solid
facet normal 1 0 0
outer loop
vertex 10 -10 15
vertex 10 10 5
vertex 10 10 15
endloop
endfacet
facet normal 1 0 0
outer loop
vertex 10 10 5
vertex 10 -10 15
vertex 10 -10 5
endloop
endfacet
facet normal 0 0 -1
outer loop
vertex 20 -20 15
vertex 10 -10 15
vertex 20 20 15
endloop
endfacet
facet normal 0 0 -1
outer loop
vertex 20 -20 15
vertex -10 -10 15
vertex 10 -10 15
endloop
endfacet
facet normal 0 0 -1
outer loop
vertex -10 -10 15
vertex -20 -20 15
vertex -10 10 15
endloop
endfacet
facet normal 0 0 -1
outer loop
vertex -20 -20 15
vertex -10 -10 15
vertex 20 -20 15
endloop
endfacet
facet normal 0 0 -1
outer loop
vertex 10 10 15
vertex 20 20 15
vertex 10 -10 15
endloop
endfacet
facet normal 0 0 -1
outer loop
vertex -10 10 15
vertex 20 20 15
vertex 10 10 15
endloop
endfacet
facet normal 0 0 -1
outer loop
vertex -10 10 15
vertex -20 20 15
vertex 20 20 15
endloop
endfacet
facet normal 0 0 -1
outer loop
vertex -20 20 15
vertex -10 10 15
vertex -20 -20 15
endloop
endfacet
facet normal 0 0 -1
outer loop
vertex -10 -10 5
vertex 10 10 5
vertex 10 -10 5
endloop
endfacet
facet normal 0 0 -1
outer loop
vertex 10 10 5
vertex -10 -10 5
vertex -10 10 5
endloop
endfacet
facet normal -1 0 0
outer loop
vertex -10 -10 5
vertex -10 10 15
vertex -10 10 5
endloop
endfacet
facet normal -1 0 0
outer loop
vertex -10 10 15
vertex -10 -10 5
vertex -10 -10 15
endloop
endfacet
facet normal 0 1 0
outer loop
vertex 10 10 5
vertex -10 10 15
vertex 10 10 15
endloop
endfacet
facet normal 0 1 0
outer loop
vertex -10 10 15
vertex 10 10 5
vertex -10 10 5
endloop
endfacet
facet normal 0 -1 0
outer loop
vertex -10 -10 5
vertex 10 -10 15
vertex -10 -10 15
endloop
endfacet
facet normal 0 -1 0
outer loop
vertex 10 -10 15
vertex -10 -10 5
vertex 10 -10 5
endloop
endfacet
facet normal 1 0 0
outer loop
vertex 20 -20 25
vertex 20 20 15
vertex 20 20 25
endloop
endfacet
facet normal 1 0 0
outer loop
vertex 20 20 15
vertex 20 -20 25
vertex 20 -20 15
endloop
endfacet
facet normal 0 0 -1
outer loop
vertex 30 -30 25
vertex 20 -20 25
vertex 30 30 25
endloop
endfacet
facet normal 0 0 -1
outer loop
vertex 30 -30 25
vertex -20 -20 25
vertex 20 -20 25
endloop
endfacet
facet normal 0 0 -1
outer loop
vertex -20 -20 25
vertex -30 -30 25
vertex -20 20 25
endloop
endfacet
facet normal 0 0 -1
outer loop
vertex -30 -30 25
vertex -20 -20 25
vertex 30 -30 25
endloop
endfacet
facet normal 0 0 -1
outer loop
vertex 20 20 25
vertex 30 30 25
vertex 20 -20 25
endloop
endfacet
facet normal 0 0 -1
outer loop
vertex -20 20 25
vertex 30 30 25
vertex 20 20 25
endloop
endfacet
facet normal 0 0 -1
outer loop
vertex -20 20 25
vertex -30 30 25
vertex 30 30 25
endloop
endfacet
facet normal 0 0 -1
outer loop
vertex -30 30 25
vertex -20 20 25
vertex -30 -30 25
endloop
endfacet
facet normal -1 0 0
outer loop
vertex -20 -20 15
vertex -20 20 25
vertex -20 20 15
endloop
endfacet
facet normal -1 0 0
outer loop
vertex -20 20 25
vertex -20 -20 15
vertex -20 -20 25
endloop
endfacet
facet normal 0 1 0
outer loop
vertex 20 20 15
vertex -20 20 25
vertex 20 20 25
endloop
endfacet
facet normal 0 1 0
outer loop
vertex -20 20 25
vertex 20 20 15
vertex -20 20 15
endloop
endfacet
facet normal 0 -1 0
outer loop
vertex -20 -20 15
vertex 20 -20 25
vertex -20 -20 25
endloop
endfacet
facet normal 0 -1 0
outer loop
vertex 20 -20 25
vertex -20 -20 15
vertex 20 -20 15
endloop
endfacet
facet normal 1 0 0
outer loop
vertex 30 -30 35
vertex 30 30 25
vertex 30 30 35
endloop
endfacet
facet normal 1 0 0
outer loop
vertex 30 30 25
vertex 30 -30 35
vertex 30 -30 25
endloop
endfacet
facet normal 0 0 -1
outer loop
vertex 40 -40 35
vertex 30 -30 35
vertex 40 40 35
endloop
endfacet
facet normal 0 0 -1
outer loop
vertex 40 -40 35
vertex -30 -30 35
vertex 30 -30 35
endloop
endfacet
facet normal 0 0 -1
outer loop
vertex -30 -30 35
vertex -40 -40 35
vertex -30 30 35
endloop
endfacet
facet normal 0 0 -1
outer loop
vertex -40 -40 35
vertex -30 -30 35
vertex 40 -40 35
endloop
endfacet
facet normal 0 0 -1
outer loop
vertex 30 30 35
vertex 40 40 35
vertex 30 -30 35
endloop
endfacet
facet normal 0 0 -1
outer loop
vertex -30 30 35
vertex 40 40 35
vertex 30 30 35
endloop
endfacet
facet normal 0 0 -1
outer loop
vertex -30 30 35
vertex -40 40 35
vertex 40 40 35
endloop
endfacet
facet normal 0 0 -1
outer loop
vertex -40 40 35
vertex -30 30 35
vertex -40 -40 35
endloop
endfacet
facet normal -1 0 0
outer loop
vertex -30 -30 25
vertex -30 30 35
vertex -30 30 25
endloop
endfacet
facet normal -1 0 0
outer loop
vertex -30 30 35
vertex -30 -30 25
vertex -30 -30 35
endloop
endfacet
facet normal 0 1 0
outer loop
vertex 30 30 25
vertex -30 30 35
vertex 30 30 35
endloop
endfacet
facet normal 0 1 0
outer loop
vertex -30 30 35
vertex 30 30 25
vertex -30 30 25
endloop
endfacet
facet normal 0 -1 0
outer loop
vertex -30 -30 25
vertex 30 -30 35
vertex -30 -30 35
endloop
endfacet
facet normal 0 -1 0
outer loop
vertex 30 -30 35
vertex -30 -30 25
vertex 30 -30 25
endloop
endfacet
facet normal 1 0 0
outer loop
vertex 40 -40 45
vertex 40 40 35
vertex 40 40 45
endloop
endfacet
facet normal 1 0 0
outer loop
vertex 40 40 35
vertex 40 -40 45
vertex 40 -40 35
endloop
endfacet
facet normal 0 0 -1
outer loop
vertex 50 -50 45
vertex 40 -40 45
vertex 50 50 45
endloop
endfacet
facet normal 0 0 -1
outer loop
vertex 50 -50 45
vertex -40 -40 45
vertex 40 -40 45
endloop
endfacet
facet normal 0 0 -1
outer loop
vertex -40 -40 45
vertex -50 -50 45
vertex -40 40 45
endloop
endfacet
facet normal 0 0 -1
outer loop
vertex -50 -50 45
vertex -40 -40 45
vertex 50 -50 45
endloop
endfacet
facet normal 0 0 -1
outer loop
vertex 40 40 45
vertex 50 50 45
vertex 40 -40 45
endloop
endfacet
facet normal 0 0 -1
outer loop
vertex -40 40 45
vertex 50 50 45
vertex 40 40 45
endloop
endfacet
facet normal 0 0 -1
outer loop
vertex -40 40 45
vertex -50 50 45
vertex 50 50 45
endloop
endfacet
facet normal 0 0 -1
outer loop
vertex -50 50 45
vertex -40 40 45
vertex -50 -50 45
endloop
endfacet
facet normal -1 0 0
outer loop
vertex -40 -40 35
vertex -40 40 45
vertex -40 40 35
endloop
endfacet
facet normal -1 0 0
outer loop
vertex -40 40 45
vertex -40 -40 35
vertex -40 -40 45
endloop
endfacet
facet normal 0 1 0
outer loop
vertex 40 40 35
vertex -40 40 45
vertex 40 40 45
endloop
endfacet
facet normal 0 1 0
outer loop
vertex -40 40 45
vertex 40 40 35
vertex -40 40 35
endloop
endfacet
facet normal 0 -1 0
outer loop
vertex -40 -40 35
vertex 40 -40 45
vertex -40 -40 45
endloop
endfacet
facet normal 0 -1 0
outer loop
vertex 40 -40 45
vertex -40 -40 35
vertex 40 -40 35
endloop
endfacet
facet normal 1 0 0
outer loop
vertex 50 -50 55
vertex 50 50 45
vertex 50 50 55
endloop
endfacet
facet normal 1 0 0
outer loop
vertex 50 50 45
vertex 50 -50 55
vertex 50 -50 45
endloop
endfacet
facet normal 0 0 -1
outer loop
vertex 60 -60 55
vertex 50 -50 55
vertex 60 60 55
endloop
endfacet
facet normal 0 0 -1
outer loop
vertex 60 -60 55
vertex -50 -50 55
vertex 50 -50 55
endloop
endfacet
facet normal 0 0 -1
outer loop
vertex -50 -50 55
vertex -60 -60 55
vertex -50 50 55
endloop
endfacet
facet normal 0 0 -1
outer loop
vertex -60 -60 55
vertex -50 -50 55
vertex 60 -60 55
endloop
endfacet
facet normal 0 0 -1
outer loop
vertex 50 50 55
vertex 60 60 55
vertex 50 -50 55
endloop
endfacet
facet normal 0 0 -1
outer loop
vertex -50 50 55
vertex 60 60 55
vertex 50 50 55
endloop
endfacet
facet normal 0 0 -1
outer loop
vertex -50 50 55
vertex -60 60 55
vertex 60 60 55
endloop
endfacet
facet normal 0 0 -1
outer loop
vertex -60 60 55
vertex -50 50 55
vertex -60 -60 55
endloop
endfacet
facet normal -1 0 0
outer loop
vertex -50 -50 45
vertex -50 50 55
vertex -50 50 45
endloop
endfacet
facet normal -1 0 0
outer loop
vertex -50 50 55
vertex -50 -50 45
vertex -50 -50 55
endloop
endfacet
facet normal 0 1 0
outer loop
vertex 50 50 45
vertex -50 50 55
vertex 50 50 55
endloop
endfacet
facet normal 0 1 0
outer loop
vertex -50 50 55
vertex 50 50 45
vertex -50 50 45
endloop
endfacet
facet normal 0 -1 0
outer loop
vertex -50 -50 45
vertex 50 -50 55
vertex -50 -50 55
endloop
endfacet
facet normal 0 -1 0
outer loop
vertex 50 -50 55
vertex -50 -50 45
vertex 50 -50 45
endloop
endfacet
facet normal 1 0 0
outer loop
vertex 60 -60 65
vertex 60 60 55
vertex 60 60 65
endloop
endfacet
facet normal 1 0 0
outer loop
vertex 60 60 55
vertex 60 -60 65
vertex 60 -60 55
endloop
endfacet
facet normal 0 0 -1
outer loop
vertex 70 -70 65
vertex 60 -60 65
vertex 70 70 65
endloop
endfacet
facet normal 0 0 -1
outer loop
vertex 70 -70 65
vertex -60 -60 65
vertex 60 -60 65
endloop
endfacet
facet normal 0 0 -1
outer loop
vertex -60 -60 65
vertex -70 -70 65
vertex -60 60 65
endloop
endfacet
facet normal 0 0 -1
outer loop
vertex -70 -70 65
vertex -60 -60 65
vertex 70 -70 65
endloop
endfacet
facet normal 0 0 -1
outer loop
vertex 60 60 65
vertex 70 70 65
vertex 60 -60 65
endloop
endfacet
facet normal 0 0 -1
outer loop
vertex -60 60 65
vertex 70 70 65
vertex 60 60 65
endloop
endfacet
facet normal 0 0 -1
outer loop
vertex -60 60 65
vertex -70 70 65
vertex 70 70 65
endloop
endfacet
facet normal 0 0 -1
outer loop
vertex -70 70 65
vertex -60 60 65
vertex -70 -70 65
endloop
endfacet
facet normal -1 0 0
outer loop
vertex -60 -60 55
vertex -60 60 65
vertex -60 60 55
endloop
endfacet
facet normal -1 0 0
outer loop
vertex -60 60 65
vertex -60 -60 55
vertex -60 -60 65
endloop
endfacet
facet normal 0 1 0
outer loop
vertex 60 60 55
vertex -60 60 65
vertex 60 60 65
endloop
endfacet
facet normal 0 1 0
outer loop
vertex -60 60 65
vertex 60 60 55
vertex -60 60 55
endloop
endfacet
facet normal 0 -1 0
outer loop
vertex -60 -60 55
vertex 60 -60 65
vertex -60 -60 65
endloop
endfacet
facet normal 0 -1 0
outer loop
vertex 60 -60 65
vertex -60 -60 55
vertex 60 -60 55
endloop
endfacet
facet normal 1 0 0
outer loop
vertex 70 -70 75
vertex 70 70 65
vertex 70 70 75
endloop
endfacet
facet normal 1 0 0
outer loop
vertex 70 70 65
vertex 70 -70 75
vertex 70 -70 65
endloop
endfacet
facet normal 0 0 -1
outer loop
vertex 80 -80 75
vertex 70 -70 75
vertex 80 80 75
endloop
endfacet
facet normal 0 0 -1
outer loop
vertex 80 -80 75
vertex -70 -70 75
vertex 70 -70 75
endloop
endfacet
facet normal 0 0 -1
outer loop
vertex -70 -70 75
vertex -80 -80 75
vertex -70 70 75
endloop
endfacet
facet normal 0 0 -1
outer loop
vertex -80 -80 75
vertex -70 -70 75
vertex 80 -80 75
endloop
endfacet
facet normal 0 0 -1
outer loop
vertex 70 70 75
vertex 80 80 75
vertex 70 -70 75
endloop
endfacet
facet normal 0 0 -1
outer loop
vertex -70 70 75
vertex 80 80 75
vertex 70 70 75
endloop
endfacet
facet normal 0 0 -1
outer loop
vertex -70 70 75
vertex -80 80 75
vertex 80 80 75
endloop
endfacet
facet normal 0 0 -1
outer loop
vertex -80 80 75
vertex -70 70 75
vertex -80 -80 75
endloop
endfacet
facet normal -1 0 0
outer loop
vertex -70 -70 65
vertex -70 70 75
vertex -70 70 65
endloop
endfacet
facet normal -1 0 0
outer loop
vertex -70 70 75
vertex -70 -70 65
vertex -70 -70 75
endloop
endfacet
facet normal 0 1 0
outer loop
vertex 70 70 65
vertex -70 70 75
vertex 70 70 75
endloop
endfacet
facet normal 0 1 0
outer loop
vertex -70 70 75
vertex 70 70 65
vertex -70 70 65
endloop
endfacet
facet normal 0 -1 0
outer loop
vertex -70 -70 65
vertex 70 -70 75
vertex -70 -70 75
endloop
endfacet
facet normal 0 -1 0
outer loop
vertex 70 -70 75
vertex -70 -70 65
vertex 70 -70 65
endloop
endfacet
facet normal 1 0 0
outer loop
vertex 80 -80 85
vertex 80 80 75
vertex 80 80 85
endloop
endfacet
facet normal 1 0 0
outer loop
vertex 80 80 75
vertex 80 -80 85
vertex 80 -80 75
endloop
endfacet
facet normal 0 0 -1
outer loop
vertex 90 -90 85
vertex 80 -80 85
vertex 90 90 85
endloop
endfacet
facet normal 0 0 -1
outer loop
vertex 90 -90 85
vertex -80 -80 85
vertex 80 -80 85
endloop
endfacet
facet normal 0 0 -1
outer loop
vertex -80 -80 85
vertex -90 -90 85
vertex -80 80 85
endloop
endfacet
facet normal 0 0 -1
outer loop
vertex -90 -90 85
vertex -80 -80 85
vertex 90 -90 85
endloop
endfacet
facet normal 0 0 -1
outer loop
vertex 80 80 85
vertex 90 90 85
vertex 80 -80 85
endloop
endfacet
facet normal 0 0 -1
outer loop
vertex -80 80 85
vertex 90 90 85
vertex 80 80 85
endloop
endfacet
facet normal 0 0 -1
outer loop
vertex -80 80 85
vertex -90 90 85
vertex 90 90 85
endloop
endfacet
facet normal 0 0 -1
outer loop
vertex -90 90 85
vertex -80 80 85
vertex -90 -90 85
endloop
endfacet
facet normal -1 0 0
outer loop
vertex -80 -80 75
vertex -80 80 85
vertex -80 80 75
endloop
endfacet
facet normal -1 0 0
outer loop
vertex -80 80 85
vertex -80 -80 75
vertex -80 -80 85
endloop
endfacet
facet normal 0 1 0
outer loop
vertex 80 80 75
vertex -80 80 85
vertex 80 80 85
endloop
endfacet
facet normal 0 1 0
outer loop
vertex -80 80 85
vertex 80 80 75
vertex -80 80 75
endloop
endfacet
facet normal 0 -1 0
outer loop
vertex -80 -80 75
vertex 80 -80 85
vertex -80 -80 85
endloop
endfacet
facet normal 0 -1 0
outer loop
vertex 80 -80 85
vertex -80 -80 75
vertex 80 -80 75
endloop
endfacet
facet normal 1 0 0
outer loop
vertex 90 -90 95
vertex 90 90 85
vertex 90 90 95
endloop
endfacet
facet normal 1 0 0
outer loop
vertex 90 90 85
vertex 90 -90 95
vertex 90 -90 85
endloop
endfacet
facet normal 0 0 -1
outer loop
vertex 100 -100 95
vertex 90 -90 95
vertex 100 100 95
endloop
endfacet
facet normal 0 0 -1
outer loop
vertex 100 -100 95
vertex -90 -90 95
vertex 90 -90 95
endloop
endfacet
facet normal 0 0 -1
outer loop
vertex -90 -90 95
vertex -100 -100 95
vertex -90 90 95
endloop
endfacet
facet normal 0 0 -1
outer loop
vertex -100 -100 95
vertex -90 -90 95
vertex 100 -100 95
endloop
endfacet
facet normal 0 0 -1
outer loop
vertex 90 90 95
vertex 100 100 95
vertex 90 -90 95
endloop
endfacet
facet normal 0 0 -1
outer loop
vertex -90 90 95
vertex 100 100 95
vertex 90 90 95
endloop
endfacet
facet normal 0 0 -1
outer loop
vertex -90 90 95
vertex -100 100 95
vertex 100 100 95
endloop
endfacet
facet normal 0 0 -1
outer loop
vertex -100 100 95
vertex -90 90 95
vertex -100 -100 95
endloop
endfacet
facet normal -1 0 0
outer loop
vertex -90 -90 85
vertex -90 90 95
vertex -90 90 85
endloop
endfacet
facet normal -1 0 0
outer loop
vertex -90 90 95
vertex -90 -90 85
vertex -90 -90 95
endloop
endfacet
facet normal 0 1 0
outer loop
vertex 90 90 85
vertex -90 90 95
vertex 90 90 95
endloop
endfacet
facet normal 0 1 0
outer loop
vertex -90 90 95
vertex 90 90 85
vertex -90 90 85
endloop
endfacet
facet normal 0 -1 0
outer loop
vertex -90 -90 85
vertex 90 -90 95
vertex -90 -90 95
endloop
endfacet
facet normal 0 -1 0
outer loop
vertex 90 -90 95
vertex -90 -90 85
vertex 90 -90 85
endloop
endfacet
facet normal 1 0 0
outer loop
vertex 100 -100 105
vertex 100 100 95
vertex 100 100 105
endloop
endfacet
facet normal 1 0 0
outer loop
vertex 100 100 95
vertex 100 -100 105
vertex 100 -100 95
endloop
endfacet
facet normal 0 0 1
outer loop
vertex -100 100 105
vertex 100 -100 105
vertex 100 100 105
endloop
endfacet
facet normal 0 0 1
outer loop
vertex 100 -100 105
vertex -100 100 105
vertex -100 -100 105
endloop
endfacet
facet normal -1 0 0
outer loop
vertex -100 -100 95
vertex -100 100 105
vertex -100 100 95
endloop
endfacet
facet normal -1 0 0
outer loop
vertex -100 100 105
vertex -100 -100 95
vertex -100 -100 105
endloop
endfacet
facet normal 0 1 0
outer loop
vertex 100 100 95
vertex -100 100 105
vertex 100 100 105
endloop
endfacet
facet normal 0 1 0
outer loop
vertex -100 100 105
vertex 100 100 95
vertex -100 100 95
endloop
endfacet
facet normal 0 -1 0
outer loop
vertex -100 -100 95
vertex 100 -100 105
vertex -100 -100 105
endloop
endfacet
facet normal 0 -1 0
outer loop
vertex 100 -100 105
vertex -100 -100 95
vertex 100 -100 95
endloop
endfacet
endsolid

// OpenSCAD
for (i=[1:10]) {
  translate([0, 0, i*10]) {
    cube(size=[i*20, i*20, 10], center=true);
  }
}
